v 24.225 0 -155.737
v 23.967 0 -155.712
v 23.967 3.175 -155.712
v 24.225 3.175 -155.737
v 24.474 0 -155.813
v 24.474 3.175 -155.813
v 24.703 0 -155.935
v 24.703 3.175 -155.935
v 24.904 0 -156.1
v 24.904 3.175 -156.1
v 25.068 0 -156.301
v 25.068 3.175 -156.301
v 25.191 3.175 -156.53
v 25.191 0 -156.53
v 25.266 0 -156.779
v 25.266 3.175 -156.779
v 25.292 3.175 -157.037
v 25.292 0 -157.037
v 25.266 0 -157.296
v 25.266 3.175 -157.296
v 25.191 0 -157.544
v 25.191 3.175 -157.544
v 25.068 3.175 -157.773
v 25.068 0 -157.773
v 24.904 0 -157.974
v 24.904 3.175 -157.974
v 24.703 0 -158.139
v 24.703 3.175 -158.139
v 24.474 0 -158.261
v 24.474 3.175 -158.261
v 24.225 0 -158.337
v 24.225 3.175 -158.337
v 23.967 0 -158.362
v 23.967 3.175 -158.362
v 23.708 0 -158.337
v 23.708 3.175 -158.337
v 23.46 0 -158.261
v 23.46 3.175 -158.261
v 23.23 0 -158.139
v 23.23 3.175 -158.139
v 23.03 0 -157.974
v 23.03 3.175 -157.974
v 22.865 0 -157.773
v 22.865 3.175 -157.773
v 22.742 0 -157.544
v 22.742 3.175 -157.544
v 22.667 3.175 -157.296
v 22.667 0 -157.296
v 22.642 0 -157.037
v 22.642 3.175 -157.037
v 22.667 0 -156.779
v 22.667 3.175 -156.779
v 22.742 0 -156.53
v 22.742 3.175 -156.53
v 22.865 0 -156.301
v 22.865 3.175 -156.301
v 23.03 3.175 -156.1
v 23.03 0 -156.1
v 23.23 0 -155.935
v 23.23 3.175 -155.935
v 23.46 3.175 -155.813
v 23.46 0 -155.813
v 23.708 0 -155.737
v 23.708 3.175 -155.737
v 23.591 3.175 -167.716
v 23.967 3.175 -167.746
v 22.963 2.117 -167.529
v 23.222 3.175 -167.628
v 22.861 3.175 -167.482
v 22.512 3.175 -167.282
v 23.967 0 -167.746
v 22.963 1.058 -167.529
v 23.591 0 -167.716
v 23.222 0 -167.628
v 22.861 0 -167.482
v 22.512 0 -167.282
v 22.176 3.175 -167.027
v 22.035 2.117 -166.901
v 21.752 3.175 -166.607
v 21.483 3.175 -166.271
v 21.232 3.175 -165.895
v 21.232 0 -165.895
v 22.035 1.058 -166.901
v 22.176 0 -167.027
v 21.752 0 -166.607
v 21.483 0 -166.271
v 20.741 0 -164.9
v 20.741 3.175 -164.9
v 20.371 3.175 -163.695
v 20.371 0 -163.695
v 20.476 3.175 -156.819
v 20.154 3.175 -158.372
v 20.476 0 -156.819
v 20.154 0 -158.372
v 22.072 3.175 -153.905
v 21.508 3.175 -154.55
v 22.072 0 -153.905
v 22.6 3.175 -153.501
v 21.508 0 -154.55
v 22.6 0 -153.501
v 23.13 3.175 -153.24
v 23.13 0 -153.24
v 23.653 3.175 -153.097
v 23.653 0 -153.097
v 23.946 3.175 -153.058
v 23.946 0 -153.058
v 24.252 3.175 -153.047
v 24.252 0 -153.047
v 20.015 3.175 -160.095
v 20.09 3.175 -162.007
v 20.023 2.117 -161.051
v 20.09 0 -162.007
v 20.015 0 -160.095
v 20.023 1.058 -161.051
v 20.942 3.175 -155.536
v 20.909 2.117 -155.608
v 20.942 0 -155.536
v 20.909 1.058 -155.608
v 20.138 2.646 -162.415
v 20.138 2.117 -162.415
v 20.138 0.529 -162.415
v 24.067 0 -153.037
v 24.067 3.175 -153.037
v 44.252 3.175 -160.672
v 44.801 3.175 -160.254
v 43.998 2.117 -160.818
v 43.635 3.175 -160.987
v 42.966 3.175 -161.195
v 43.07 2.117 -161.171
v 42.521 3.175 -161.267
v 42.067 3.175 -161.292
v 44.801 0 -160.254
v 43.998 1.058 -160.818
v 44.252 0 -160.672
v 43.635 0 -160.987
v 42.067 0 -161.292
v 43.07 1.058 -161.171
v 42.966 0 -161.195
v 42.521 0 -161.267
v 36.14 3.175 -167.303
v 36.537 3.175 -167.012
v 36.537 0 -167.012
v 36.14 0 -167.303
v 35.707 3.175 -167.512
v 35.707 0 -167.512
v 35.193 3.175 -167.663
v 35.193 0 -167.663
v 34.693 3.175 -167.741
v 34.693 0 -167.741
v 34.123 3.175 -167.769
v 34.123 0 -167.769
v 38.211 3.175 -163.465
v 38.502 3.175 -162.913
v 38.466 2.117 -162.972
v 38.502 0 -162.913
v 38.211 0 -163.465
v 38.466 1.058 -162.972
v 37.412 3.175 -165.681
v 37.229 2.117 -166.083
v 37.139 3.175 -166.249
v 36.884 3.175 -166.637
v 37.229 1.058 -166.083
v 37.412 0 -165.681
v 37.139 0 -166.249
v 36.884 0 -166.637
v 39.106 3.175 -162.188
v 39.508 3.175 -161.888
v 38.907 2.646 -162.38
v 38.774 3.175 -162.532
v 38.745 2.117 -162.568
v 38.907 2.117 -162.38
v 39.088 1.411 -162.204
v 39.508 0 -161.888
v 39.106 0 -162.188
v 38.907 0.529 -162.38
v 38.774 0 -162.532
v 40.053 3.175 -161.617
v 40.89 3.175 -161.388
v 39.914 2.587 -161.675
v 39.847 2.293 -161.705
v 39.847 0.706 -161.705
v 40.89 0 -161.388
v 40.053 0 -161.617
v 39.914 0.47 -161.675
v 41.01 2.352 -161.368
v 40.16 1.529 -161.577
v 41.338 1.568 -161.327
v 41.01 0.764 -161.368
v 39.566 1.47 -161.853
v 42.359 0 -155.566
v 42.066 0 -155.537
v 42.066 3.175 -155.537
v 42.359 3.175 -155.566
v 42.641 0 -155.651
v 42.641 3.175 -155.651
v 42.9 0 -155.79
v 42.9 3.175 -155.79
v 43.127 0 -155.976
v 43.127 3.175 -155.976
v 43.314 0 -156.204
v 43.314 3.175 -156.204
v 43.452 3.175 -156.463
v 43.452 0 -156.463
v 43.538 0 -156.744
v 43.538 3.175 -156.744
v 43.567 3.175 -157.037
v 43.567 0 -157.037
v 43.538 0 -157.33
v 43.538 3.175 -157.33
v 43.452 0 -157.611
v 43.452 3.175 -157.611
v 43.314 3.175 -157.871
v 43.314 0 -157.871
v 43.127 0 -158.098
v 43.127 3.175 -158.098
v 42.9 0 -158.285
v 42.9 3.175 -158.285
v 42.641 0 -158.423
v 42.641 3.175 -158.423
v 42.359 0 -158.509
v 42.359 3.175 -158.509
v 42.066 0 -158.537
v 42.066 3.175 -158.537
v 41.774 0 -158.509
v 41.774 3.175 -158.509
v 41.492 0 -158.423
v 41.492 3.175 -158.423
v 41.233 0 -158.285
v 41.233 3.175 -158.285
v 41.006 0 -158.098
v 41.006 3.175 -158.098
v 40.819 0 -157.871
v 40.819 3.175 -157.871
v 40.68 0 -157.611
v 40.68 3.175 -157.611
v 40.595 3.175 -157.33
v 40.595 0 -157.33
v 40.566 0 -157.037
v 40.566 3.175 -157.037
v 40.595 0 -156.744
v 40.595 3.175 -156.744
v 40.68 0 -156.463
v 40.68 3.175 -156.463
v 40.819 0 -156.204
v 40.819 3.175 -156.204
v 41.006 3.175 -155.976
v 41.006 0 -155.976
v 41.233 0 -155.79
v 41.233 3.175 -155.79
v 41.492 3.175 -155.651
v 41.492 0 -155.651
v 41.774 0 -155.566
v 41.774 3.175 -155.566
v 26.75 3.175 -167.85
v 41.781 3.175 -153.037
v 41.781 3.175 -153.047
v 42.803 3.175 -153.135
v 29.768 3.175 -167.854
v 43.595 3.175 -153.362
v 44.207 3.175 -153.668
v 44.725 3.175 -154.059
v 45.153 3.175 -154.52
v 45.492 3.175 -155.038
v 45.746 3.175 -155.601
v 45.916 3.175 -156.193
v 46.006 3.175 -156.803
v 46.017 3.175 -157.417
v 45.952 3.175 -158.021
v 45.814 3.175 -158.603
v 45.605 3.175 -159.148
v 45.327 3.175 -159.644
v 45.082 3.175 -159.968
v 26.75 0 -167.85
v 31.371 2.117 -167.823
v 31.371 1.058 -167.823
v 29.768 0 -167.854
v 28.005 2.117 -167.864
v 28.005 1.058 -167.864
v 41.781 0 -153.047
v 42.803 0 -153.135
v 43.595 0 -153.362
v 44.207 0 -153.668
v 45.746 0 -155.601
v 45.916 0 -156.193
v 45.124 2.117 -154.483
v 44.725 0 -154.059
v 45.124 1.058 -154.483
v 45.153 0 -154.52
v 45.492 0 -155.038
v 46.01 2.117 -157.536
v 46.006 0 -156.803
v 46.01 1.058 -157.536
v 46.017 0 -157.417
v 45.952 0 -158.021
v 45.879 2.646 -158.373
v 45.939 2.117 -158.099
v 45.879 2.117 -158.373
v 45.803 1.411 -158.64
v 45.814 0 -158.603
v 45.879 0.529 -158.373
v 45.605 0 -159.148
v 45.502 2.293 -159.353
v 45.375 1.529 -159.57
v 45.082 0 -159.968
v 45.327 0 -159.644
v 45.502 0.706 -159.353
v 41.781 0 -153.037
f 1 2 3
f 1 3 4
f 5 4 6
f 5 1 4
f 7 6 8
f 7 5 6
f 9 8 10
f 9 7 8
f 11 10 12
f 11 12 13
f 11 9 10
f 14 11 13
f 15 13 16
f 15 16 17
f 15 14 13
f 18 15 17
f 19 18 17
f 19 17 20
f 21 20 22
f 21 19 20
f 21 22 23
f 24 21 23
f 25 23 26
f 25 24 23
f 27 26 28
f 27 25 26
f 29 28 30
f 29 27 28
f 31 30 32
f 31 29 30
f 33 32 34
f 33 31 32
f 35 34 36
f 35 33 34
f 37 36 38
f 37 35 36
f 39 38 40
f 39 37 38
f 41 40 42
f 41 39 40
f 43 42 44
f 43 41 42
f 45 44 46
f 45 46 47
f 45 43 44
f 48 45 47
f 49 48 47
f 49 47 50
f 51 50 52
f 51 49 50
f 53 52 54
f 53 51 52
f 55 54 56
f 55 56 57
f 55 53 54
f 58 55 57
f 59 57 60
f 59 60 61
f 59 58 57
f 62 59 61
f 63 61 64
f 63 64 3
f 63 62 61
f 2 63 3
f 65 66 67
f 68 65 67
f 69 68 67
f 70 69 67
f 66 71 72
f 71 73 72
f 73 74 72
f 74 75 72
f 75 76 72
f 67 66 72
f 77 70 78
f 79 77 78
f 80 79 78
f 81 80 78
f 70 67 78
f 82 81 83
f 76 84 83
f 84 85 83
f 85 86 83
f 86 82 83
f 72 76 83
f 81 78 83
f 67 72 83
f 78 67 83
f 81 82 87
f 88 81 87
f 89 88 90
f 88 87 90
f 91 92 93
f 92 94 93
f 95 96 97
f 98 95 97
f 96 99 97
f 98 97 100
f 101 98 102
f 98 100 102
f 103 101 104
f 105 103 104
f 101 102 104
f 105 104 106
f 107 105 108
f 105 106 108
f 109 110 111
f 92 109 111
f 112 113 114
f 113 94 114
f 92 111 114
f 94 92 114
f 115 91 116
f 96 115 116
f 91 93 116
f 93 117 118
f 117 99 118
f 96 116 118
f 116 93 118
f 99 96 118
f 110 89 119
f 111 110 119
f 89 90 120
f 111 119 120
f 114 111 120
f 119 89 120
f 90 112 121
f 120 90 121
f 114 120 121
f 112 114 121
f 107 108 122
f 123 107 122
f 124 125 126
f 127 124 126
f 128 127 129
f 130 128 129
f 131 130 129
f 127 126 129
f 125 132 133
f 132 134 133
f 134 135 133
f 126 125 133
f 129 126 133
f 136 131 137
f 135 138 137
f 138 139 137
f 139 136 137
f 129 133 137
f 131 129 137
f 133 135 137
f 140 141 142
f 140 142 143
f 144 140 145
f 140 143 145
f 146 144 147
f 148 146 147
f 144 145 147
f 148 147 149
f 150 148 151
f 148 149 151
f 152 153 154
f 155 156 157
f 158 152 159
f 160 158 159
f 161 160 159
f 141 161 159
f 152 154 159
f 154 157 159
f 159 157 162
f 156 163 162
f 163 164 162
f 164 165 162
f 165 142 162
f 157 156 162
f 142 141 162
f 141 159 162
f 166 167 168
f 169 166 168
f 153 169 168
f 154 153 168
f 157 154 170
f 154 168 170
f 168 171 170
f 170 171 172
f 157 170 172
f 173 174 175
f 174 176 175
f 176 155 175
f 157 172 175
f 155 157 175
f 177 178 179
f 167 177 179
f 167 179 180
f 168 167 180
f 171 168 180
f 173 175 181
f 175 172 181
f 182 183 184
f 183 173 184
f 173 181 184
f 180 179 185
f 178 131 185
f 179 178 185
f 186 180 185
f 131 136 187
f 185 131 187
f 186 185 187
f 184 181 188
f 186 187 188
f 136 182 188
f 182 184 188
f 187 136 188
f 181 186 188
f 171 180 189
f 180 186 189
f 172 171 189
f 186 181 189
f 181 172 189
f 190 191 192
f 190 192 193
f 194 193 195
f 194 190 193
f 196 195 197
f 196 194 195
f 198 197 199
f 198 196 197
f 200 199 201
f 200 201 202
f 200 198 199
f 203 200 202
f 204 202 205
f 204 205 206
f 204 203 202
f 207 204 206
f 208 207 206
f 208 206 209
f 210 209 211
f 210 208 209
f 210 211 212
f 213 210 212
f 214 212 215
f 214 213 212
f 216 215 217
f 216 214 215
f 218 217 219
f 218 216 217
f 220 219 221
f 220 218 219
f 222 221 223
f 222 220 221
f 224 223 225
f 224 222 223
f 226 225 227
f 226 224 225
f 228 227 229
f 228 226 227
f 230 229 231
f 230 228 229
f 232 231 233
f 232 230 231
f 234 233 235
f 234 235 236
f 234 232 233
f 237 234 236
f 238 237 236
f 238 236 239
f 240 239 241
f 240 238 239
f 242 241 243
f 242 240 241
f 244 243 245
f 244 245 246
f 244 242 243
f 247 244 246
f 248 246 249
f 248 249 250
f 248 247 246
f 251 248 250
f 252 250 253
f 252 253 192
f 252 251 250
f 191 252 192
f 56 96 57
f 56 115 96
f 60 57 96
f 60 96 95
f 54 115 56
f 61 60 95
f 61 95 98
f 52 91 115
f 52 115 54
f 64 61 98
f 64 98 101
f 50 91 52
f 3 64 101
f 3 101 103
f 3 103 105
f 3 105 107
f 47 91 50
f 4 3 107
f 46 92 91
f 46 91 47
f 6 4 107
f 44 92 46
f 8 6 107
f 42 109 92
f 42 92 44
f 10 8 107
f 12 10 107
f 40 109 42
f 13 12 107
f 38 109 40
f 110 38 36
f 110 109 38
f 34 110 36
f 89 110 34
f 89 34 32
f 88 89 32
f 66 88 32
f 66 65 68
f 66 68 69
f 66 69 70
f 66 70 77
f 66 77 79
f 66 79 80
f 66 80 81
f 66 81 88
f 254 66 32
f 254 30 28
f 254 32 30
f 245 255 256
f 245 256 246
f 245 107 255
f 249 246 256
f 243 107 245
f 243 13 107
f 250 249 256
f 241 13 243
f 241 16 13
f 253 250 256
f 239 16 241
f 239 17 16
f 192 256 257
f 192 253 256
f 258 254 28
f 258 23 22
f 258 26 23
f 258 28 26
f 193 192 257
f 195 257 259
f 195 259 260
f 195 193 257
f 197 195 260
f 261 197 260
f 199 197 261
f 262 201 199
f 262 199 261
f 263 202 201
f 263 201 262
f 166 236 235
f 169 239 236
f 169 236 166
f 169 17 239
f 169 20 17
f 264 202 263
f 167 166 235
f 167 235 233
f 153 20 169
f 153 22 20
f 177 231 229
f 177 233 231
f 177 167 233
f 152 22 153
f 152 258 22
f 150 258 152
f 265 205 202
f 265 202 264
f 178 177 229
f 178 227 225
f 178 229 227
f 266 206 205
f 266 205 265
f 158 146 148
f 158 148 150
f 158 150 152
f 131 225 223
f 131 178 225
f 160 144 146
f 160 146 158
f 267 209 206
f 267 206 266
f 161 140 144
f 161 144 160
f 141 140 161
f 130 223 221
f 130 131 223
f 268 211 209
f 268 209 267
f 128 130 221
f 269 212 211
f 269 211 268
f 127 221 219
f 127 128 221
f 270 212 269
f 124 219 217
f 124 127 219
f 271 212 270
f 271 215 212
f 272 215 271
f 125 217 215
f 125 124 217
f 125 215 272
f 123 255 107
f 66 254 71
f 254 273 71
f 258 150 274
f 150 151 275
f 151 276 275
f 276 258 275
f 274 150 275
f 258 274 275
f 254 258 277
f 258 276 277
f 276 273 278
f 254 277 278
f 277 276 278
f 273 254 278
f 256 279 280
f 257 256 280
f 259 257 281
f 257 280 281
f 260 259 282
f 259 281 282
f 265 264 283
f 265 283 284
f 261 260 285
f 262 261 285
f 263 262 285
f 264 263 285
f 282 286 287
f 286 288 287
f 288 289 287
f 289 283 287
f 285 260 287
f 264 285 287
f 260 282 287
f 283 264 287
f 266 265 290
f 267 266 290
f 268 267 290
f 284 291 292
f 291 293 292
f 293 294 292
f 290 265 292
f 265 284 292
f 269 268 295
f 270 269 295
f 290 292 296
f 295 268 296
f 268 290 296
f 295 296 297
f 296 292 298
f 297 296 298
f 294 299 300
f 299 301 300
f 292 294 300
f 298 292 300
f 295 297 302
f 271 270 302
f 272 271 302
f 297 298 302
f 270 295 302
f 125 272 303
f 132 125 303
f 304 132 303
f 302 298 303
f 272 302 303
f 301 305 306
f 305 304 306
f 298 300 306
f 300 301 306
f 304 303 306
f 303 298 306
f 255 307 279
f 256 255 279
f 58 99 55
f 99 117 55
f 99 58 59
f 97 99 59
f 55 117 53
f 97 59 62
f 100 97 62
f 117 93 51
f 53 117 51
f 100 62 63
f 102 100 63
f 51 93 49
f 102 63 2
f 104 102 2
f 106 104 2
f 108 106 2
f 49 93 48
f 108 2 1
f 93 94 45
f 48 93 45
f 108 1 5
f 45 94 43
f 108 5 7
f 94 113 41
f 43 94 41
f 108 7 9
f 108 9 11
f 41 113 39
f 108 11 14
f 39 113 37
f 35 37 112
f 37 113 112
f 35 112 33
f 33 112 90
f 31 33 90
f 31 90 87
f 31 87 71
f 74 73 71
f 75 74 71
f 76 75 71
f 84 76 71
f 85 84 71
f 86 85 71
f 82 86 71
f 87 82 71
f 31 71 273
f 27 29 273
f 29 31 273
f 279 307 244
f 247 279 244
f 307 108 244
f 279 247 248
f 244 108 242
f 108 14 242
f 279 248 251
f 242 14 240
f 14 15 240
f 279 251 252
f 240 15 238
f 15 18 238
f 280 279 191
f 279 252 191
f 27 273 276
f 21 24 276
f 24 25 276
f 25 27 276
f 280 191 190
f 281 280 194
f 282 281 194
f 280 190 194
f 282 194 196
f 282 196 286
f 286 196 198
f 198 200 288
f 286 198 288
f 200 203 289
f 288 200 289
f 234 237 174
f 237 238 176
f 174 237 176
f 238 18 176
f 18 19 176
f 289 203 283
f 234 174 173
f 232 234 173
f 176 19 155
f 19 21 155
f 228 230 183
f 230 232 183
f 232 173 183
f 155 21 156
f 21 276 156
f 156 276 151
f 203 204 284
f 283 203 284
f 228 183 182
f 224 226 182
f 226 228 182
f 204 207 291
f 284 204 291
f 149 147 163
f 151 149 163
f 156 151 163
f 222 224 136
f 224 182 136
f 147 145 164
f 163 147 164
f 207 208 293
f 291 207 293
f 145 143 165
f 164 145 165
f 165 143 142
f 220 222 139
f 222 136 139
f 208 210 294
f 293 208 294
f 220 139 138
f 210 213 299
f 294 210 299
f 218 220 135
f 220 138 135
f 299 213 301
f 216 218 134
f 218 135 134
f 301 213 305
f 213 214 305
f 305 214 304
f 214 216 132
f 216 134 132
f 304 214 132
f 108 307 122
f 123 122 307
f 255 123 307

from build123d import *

# Parameters (mm, degrees)
SKETCH1_R           = 1.3251
SKETCH1_R_2         = 1.5002
BOSS_EXTRUDE1_DEPTH = 3.175


with BuildPart() as part:
    # Sketch1 → Boss-Extrude1 (new body)
    with BuildSketch(Plane(origin=(0, 0, 0), x_dir=(1, 0, 0), z_dir=(0, 1, 0))):
        with BuildLine():
            Line((24.252360584, 153.047337226), (24.066660584, 153.037137226))
            Line((24.066660584, 153.037137226), (41.780860584, 153.037137226))
            Line((41.780860584, 153.037137226), (41.780860584, 153.047237226))
            add(Edge.make_bspline(
                [(41.780860584, 153.047237226), (46.472460584, 153.023637226), (46.937960584, 158.355437226), (44.801360584, 160.253637226)],
                knots=[0.3, 0.3, 0.3, 0.3, 0.4, 0.4, 0.4, 0.4], degree=3))
            add(Edge.make_bspline(
                [(44.801360584, 160.253637226), (44.076060584, 160.918437226), (43.092260584, 161.292037226), (42.066560584, 161.292037226)],
                knots=[0.4, 0.4, 0.4, 0.4, 0.5, 0.5, 0.5, 0.5], degree=3))
            add(Edge.make_bspline(
                [(42.066560584, 161.292037226), (35.872760584, 161.305437226), (39.575560584, 167.746037226), (34.122660584, 167.769037226)],
                knots=[0.5, 0.5, 0.5, 0.5, 0.6, 0.6, 0.6, 0.6], degree=3))
            add(Edge.make_bspline(
                [(34.122660584, 167.769037226), (31.657460584, 167.779437226), (28.361660584, 167.993537226), (23.966660584, 167.746037226)],
                knots=[0.6, 0.6, 0.6, 0.6, 0.7, 0.7, 0.7, 0.7], degree=3))
            add(Edge.make_bspline(
                [(23.966660584, 167.746037226), (22.940960584, 167.746037226), (21.957160584, 167.079937226), (21.231860584, 165.894837226)],
                knots=[0.7, 0.7, 0.7, 0.7, 0.8, 0.8, 0.8, 0.8], degree=3))
            add(Edge.make_bspline(
                [(21.231860584, 165.894837226), (19.095260584, 162.510837226), (19.560760584, 153.005437226), (24.252360584, 153.047337226)],
                knots=[0.8, 0.8, 0.8, 0.8, 1, 1, 1, 1], degree=3))
        make_face()
        with Locations(Location((23.966660584, 157.037137226, 0), (0, 0, 270))):
            Circle(SKETCH1_R, mode=Mode.SUBTRACT)
        with Locations(Location((42.066460584, 157.037137226, 0), (0, 0, 270))):
            Circle(SKETCH1_R_2, mode=Mode.SUBTRACT)
    extrude(amount=BOSS_EXTRUDE1_DEPTH)


solid = part.part
